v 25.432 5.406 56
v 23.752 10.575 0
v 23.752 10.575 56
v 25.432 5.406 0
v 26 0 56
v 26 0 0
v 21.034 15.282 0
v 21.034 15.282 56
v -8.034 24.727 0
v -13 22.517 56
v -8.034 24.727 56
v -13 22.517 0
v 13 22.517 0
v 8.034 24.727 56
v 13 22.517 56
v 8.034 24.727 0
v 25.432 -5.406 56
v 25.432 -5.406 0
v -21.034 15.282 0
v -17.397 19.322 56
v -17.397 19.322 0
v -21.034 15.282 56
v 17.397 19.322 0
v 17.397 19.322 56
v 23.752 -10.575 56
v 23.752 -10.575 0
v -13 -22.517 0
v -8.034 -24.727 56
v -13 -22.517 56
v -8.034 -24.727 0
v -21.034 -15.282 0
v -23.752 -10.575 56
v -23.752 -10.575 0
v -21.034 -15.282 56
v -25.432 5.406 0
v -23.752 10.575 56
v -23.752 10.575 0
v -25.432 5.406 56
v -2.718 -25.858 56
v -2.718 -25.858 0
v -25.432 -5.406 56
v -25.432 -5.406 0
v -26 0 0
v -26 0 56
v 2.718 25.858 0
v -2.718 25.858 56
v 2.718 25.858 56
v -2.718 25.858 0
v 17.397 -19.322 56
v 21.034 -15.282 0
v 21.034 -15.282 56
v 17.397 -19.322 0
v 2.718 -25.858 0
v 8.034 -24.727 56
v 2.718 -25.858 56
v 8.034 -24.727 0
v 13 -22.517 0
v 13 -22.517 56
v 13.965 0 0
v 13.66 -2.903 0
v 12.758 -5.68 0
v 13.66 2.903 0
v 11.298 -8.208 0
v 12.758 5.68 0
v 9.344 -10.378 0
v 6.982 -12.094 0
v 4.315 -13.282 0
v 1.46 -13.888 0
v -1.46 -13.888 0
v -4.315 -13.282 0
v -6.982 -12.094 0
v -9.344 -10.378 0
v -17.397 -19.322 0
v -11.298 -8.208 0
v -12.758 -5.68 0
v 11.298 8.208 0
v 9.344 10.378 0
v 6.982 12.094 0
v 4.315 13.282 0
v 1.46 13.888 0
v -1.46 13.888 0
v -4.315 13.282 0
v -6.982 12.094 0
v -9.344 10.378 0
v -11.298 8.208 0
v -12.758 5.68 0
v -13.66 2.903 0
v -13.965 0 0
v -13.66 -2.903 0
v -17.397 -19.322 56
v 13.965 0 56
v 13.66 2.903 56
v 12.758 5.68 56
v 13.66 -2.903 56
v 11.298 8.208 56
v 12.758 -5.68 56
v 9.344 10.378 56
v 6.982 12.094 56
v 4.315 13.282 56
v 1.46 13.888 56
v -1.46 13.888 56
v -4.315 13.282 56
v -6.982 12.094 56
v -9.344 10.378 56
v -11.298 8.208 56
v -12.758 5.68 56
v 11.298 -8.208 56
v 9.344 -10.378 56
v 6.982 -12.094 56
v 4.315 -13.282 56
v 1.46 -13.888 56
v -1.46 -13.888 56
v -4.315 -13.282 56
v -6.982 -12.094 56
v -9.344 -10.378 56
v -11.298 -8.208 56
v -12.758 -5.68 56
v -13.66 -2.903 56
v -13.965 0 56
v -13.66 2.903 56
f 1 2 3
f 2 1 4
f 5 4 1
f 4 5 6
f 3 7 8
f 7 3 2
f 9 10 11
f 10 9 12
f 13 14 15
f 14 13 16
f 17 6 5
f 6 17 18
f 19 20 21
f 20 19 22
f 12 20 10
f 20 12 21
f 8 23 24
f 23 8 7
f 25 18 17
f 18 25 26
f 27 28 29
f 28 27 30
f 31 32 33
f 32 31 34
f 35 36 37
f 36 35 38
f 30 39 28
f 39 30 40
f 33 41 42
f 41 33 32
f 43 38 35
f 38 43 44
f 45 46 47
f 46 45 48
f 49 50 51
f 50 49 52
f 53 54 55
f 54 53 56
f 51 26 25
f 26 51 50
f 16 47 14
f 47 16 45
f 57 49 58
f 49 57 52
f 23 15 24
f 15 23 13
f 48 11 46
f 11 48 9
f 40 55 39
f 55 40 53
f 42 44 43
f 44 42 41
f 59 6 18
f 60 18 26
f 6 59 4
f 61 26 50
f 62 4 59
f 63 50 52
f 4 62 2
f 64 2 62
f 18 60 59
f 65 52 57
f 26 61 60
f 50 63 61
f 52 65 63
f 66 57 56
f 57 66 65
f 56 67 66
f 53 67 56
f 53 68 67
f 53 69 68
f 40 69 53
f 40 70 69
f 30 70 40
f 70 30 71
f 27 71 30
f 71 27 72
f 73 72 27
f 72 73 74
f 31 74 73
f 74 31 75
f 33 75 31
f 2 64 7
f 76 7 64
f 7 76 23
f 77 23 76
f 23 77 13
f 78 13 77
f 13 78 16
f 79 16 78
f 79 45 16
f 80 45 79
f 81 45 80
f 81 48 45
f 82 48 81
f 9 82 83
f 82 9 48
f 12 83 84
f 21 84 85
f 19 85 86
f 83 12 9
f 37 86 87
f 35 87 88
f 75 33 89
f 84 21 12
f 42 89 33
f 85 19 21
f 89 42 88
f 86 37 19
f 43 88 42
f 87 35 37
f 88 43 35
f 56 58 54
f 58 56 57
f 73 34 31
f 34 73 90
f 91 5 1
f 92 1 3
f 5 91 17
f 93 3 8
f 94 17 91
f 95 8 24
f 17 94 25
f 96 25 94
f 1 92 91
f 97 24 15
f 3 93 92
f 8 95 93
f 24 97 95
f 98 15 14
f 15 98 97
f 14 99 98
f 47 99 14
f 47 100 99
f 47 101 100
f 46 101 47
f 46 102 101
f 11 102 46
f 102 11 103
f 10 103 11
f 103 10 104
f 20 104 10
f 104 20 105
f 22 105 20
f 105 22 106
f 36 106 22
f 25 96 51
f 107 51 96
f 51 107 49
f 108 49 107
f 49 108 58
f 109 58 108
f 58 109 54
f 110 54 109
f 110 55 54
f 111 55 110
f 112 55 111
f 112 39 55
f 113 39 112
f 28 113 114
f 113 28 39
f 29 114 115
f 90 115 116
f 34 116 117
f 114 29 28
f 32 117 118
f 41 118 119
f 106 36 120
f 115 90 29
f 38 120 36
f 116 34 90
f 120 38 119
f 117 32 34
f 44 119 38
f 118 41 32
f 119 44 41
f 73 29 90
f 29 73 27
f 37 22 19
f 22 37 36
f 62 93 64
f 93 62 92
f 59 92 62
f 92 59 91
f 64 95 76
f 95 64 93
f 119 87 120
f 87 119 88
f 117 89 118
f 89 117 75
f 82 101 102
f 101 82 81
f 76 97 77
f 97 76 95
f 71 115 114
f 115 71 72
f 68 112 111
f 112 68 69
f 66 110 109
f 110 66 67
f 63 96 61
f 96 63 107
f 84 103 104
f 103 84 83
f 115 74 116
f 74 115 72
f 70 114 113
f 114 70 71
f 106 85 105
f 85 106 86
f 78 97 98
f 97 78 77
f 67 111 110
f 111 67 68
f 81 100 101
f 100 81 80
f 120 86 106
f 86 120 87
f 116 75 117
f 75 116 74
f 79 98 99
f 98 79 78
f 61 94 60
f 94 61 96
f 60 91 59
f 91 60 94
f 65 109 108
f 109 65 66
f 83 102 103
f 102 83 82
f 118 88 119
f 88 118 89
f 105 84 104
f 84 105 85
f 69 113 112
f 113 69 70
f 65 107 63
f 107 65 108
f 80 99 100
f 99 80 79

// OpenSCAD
difference() {
cylinder(r=52/2,h=56);
translate([0, 0, -1]) cylinder(r=27.93/2, h=58);
}
